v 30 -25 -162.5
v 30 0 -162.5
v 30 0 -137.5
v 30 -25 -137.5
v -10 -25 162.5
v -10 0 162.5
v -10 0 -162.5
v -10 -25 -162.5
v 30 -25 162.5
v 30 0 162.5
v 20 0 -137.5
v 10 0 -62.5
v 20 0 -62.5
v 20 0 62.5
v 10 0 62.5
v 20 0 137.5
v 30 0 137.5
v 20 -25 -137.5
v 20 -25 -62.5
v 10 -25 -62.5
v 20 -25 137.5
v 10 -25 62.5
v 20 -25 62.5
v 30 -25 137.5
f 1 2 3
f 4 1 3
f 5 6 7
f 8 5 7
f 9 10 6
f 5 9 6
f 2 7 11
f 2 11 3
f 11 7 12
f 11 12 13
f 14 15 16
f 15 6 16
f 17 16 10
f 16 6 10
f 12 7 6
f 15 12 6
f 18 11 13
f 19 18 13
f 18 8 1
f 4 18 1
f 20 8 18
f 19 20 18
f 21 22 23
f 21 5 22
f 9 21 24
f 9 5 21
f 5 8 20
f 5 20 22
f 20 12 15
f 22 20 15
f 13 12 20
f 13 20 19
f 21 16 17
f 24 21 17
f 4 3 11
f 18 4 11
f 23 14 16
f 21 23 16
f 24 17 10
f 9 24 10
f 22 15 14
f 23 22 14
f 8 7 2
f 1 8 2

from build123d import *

# Parameters (mm, degrees)
F0_W     = 10
F0_H     = 75
F1_DEPTH = 25


with BuildPart() as f1:
    # F0 (on Front) → F1 (new body)
    with BuildSketch(Plane.XZ):
        Polygon((10, 162.5), (-10, 162.5), (-10, -162.5), (10, -162.5), (10, -137.5), (10, -62.5), (10, 62.5), (10, 137.5), align=None)
        Polygon((30, 162.5), (10, 162.5), (10, 137.5), (20, 137.5), (30, 137.5), align=None)
        with Locations((15, 100)):
            Rectangle(F0_W, F0_H)
        Polygon((10, -137.5), (10, -162.5), (30, -162.5), (30, -137.5), (20, -137.5), align=None)
        with Locations((15, -100)):
            Rectangle(F0_W, F0_H)
    extrude(amount=F1_DEPTH)


solid = f1.part
